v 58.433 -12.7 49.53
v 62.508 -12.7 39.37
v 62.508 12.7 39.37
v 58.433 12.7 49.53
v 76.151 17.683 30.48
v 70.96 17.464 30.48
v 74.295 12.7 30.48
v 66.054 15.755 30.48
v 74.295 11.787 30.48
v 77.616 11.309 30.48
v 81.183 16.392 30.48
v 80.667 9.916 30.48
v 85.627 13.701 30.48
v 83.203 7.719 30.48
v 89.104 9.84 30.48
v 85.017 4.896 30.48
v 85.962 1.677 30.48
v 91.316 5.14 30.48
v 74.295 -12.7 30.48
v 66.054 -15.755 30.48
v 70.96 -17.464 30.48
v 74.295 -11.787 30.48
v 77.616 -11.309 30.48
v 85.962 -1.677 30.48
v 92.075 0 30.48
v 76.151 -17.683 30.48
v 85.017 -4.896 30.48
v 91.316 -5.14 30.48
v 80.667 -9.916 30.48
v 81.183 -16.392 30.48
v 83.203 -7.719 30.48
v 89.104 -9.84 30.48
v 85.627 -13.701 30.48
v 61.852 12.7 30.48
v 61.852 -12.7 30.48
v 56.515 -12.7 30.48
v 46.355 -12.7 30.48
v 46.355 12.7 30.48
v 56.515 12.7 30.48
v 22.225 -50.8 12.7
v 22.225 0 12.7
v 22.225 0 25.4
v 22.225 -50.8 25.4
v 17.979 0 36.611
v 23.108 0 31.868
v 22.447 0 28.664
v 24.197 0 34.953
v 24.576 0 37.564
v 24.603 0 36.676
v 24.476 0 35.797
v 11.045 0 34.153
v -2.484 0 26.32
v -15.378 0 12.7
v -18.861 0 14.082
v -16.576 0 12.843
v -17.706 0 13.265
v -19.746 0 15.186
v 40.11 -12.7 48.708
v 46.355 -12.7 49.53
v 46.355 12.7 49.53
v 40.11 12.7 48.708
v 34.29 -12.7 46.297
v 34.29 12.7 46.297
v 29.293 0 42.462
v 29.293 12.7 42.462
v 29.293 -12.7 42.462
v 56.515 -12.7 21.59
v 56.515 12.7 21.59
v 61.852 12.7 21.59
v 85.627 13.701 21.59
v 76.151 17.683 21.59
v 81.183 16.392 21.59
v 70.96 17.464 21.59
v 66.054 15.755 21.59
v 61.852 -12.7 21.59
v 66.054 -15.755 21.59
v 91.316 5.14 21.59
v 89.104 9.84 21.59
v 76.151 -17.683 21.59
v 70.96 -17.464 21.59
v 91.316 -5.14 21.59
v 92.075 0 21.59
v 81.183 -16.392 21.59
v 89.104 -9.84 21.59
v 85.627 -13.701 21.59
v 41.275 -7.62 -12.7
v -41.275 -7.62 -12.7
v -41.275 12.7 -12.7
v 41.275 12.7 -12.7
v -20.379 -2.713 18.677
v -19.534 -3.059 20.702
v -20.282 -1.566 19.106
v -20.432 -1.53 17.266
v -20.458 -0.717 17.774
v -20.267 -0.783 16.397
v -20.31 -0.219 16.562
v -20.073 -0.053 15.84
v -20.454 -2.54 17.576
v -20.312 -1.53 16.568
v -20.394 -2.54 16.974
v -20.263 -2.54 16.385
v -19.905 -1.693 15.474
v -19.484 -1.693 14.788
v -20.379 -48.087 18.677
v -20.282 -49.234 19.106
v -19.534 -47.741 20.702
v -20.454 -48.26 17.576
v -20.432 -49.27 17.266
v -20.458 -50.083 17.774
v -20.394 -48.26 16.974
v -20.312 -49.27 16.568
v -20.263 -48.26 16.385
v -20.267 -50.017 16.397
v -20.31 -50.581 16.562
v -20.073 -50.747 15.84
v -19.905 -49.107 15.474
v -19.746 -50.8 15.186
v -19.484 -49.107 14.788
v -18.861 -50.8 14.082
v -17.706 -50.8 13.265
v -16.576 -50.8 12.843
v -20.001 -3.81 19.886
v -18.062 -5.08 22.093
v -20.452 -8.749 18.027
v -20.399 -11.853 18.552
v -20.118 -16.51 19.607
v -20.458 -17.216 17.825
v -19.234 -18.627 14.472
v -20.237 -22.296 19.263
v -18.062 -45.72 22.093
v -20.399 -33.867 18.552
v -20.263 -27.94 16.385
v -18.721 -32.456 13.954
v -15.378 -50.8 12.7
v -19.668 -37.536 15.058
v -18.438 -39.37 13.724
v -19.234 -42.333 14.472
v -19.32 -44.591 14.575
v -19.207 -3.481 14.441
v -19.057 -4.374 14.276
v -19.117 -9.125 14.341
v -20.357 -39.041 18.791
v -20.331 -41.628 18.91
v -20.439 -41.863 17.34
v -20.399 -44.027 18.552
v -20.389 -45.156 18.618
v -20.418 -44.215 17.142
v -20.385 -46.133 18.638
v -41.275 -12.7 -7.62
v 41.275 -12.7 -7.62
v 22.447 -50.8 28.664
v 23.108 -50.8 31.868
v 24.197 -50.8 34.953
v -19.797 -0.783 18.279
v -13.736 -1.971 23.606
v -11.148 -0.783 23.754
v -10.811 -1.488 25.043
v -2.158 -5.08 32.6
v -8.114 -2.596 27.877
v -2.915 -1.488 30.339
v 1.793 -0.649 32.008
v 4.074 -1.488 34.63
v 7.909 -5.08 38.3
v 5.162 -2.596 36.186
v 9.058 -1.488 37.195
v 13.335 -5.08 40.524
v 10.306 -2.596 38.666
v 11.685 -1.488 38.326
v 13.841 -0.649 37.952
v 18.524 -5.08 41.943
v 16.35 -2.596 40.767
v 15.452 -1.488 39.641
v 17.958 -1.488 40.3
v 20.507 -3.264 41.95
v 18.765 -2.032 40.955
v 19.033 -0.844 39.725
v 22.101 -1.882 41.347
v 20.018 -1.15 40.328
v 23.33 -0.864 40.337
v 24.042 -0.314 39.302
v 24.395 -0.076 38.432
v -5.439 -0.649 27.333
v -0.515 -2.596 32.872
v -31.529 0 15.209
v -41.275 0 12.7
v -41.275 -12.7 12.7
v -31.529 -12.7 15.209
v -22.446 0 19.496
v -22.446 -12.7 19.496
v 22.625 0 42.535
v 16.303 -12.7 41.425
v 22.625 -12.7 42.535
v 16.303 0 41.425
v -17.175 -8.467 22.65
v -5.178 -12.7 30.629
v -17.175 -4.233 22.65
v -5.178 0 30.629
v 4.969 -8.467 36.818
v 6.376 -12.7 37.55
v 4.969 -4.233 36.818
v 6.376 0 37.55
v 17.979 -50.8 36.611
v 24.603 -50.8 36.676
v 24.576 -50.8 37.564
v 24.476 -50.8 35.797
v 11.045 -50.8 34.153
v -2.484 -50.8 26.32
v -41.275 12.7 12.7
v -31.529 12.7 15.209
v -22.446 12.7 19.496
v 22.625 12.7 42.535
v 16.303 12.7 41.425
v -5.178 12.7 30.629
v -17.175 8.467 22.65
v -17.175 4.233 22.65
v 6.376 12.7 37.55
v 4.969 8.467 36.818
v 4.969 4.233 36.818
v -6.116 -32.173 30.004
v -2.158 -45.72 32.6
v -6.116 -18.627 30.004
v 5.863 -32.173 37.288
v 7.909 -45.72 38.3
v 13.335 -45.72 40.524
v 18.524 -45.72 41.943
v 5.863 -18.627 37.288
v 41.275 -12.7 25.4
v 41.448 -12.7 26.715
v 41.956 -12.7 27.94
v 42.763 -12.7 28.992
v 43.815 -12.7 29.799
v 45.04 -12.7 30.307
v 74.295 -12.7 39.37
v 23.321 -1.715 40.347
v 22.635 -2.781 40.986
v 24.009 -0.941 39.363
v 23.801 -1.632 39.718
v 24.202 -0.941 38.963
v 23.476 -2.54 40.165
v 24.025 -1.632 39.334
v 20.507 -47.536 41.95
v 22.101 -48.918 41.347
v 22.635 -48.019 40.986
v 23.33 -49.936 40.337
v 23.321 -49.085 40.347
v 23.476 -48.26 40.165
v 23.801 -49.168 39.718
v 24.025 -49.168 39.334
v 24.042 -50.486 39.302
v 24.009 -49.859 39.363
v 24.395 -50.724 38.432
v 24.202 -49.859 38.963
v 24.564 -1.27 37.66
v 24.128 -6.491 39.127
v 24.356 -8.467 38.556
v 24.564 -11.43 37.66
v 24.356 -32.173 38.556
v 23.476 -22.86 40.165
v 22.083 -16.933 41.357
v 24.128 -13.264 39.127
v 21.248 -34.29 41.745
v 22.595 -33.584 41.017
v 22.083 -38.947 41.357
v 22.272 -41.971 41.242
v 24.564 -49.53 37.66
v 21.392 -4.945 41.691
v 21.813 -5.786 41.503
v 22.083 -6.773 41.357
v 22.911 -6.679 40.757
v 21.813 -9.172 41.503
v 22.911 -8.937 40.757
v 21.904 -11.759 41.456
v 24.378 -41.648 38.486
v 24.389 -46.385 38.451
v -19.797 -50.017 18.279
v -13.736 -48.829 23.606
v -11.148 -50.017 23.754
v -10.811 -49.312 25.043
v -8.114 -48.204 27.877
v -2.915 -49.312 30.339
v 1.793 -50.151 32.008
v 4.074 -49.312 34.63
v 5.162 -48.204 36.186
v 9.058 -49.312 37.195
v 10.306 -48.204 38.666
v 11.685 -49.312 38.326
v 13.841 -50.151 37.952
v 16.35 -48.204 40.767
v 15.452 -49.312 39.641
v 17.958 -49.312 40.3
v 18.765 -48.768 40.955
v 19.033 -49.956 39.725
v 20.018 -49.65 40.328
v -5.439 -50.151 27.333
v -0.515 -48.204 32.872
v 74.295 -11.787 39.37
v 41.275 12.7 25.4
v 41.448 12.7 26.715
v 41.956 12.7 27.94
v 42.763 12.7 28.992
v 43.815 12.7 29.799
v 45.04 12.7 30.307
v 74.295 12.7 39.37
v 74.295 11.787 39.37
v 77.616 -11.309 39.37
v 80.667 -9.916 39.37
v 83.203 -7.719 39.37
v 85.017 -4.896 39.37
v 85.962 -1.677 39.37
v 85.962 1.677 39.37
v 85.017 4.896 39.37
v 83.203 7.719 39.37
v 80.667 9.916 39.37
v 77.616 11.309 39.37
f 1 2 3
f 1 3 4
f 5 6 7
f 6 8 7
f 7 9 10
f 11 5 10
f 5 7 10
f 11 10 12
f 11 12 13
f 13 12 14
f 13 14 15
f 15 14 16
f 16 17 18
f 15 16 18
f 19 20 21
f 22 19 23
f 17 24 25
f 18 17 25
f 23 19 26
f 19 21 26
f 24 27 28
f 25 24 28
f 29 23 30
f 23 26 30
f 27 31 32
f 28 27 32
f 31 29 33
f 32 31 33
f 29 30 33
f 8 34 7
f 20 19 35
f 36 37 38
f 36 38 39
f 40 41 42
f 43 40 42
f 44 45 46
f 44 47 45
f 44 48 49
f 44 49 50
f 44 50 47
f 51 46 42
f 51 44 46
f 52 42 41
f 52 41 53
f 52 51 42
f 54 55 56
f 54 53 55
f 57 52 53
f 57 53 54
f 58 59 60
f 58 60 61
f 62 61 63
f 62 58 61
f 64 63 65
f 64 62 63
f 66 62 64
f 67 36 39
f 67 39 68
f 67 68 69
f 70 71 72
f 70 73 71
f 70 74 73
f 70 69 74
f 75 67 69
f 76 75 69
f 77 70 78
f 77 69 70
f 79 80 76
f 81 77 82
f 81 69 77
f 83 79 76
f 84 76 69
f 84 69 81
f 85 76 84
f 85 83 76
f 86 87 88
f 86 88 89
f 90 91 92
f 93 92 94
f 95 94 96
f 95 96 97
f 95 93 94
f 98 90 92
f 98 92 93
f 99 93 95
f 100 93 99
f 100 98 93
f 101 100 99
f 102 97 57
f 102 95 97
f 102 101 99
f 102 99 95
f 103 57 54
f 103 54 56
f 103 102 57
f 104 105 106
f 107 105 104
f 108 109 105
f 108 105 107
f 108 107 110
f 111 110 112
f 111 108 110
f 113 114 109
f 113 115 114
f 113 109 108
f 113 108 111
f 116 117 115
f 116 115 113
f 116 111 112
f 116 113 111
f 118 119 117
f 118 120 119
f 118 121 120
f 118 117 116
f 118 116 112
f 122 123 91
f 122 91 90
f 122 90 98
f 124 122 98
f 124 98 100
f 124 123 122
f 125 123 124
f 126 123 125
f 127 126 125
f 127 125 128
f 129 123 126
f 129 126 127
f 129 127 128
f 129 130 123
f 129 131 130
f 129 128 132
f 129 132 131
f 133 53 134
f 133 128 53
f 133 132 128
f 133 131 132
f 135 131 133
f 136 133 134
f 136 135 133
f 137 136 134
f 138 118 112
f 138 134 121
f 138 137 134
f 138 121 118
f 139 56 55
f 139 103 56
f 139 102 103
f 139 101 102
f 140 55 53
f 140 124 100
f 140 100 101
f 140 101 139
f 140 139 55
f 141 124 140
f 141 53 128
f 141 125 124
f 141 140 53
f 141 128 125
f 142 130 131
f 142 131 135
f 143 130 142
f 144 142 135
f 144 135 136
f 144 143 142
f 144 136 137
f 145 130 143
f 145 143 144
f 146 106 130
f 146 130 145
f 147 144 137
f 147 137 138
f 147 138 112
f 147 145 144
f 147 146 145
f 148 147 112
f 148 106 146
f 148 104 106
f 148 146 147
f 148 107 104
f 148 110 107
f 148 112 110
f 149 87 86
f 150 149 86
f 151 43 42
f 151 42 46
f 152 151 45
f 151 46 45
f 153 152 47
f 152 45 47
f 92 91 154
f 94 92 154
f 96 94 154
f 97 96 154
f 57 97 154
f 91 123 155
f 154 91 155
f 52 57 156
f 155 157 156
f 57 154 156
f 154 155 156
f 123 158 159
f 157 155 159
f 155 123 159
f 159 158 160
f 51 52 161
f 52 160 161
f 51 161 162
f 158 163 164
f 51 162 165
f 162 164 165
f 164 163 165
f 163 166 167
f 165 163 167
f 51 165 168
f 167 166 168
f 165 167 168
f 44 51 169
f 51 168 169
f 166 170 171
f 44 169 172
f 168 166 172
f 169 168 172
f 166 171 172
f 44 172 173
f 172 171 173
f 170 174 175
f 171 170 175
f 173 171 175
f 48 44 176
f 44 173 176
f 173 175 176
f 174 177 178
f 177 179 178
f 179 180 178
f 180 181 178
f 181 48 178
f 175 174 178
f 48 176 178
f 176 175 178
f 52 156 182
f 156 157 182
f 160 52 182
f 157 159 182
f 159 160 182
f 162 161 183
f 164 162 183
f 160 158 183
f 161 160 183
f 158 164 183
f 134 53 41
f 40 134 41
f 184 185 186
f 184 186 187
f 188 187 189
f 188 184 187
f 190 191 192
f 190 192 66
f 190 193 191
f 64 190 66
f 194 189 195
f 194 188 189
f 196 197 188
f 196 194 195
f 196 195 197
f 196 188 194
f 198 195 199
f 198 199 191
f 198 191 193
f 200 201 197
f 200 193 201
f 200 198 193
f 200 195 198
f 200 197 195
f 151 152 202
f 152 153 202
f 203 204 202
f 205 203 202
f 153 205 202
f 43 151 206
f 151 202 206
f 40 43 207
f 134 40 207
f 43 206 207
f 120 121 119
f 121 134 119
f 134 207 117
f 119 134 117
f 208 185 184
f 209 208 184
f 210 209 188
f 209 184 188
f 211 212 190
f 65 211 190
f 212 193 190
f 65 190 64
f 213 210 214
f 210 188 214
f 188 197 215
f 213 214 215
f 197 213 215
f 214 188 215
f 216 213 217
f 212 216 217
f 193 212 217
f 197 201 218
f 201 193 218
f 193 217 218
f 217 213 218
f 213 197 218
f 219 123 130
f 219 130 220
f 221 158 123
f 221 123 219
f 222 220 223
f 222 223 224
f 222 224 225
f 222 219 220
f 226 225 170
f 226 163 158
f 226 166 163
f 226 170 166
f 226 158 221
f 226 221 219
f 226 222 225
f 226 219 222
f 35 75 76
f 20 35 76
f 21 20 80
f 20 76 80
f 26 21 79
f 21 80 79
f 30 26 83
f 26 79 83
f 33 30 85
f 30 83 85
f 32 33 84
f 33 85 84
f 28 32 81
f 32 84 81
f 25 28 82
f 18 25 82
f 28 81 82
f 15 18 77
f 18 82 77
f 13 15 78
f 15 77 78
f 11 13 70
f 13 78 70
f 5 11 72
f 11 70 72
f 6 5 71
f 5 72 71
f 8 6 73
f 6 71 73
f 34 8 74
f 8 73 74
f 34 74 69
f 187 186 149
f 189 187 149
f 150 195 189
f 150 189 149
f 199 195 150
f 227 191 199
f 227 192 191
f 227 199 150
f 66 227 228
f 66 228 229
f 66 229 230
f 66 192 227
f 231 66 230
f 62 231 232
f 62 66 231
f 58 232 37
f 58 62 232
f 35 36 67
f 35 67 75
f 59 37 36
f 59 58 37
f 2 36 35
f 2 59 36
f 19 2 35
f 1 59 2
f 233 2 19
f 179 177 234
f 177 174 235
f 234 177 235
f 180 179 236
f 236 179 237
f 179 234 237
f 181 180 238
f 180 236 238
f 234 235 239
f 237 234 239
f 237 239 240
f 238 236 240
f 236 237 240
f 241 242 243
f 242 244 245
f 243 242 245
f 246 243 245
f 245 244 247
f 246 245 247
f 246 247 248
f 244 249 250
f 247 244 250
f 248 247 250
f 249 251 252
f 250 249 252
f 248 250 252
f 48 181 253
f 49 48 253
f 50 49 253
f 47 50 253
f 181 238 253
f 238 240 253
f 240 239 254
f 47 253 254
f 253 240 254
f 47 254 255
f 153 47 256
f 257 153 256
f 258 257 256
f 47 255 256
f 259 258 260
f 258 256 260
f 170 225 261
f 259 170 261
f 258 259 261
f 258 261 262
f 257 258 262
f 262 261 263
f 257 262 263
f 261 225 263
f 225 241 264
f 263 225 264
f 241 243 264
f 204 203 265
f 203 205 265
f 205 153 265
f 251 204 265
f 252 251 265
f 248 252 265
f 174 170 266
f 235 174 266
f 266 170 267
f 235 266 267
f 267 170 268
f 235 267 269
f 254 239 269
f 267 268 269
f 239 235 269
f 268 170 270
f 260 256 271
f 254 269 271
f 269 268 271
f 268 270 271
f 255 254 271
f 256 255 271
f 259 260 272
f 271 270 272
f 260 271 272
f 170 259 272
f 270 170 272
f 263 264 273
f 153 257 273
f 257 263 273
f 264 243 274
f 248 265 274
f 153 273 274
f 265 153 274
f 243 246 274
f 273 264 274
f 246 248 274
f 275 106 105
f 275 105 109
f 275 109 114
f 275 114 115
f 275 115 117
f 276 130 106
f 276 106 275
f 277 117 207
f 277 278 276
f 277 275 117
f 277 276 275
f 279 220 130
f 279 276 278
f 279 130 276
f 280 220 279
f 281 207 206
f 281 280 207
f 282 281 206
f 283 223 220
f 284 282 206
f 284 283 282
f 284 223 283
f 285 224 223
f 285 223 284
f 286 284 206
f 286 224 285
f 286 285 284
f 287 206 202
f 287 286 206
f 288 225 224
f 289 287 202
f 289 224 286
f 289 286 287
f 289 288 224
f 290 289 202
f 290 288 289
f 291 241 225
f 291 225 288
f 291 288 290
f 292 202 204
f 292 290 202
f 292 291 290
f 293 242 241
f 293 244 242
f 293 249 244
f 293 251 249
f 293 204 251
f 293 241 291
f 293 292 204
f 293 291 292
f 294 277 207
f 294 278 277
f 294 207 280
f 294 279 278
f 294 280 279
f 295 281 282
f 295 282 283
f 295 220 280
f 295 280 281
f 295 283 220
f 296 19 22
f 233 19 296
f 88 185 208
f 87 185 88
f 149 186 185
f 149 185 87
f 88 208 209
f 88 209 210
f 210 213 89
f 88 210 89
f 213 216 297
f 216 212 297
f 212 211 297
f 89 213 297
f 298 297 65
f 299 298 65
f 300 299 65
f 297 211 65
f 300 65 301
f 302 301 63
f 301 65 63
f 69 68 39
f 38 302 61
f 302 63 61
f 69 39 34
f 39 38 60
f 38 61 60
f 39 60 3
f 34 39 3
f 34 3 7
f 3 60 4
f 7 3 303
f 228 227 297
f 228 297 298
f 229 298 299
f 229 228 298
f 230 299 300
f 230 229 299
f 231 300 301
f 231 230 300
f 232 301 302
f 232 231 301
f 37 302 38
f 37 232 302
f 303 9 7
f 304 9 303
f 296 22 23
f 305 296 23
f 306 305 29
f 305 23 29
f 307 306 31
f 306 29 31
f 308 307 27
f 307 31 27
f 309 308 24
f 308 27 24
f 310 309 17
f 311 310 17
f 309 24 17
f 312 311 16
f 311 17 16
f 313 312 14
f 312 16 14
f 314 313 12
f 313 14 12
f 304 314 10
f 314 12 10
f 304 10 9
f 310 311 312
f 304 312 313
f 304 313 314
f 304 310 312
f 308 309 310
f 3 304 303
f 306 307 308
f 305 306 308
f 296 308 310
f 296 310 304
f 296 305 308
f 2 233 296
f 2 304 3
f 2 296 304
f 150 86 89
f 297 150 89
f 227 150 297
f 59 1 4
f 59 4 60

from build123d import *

# Parameters (mm, degrees)
F0_W     = 5.9931609198
F0_H     = 8.89
F1_DEPTH = 12.7
F2_DEPTH = 50.8
F4_R     = 5.08
F5_SIZE  = 5.08


with BuildPart() as f1:
    # F0 (on Front) → F1 (new body, symmetric)
    with BuildSketch(Plane.XZ):
        Polygon((-41.275, -12.7), (41.275, -12.7), (41.275, 12.7), (22.225, 12.7), (-41.275, 12.7), align=None)
        with BuildLine():
            Line((22.225, 12.7), (41.275, 12.7))
            Line((41.275, 12.7), (41.275, 25.4))
            ThreePointArc((41.275, 25.4), (42.7628975516, 28.9921024484), (46.355, 30.48))
            Line((46.355, 30.48), (56.515, 30.48))
            Line((56.515, 30.48), (56.515, 39.37))
            Line((56.515, 39.37), (62.5081609198, 39.37))
            Line((62.5081609198, 39.37), (58.4329057574, 49.53))
            Line((58.4329057574, 49.53), (46.3550021176, 49.53))
            ThreePointArc((46.3550021176, 49.53), (37.120850156, 47.6932136907), (29.2925139835, 42.4624872435))
            ThreePointArc((29.2925139835, 42.4624872435), (24.0617869733, 34.6341514471), (22.225, 25.3999996176))
            Line((22.225, 25.3999996176), (22.225, 12.7))
        make_face()
        with BuildLine():
            add(Edge.make_bspline(
                [(-41.275, 12.7), (-14.81856592, 16.292469576), (2.5012880545, 45.3286993765), (29.2925139835, 42.4624872435)],
                knots=[0, 0, 0, 0, 76.587072517, 76.587072517, 76.587072517, 76.587072517], degree=3))
            Line((-41.275, 12.7), (22.225, 12.7))
            Line((22.225, 12.7), (22.225, 25.3999996176))
            ThreePointArc((22.225, 25.3999996176), (24.0617869733, 34.6341514471), (29.2925139835, 42.4624872435))
        make_face()
        Polygon((62.5081609198, 30.48), (56.515, 30.48), (56.515, 21.59), (74.295, 21.59), (74.295, 39.37), (62.5081609198, 39.37), align=None)
        with Locations((59.5115804599, 34.925)):
            Rectangle(F0_W, F0_H)
    extrude(amount=F1_DEPTH, both=True)

    # F0 (on Front) → F3 (revolve)
    with BuildSketch(Plane.XZ):
        Polygon((62.5081609198, 30.48), (56.515, 30.48), (56.515, 21.59), (74.295, 21.59), (74.295, 39.37), (62.5081609198, 39.37), align=None)
    revolve(axis=Axis((74.295, 0, 30.48), (0, 0, 1)))

    # F5
    f5_edges = [f1.edges().sort_by_distance(p)[0] for p in [
        (0, -12.7, -12.7),
    ]]
    chamfer(f5_edges, length=F5_SIZE)


with BuildPart() as f2:
    # F0 (on Front) → F2 (new body)
    with BuildSketch(Plane.XZ):
        with BuildLine():
            add(Edge.make_bspline(
                [(-41.275, 12.7), (-14.81856592, 16.292469576), (2.5012880545, 45.3286993765), (29.2925139835, 42.4624872435)],
                knots=[0, 0, 0, 0, 76.587072517, 76.587072517, 76.587072517, 76.587072517], degree=3))
            Line((-41.275, 12.7), (22.225, 12.7))
            Line((22.225, 12.7), (22.225, 25.3999996176))
            ThreePointArc((22.225, 25.3999996176), (24.0617869733, 34.6341514471), (29.2925139835, 42.4624872435))
        make_face()
    extrude(amount=F2_DEPTH)

    # F4
    f4_edges = [f2.edges().sort_by_distance(p)[0] for p in [
        (-41.275, -25.4, 12.7),
        (29.292514, -25.4, 42.462487),
        (-6.605484, 0, 29.675779),
        (-6.605484, -50.8, 29.675779),
    ]]
    fillet(f4_edges, radius=F4_R)


solid = Compound([f1.part, f2.part])
